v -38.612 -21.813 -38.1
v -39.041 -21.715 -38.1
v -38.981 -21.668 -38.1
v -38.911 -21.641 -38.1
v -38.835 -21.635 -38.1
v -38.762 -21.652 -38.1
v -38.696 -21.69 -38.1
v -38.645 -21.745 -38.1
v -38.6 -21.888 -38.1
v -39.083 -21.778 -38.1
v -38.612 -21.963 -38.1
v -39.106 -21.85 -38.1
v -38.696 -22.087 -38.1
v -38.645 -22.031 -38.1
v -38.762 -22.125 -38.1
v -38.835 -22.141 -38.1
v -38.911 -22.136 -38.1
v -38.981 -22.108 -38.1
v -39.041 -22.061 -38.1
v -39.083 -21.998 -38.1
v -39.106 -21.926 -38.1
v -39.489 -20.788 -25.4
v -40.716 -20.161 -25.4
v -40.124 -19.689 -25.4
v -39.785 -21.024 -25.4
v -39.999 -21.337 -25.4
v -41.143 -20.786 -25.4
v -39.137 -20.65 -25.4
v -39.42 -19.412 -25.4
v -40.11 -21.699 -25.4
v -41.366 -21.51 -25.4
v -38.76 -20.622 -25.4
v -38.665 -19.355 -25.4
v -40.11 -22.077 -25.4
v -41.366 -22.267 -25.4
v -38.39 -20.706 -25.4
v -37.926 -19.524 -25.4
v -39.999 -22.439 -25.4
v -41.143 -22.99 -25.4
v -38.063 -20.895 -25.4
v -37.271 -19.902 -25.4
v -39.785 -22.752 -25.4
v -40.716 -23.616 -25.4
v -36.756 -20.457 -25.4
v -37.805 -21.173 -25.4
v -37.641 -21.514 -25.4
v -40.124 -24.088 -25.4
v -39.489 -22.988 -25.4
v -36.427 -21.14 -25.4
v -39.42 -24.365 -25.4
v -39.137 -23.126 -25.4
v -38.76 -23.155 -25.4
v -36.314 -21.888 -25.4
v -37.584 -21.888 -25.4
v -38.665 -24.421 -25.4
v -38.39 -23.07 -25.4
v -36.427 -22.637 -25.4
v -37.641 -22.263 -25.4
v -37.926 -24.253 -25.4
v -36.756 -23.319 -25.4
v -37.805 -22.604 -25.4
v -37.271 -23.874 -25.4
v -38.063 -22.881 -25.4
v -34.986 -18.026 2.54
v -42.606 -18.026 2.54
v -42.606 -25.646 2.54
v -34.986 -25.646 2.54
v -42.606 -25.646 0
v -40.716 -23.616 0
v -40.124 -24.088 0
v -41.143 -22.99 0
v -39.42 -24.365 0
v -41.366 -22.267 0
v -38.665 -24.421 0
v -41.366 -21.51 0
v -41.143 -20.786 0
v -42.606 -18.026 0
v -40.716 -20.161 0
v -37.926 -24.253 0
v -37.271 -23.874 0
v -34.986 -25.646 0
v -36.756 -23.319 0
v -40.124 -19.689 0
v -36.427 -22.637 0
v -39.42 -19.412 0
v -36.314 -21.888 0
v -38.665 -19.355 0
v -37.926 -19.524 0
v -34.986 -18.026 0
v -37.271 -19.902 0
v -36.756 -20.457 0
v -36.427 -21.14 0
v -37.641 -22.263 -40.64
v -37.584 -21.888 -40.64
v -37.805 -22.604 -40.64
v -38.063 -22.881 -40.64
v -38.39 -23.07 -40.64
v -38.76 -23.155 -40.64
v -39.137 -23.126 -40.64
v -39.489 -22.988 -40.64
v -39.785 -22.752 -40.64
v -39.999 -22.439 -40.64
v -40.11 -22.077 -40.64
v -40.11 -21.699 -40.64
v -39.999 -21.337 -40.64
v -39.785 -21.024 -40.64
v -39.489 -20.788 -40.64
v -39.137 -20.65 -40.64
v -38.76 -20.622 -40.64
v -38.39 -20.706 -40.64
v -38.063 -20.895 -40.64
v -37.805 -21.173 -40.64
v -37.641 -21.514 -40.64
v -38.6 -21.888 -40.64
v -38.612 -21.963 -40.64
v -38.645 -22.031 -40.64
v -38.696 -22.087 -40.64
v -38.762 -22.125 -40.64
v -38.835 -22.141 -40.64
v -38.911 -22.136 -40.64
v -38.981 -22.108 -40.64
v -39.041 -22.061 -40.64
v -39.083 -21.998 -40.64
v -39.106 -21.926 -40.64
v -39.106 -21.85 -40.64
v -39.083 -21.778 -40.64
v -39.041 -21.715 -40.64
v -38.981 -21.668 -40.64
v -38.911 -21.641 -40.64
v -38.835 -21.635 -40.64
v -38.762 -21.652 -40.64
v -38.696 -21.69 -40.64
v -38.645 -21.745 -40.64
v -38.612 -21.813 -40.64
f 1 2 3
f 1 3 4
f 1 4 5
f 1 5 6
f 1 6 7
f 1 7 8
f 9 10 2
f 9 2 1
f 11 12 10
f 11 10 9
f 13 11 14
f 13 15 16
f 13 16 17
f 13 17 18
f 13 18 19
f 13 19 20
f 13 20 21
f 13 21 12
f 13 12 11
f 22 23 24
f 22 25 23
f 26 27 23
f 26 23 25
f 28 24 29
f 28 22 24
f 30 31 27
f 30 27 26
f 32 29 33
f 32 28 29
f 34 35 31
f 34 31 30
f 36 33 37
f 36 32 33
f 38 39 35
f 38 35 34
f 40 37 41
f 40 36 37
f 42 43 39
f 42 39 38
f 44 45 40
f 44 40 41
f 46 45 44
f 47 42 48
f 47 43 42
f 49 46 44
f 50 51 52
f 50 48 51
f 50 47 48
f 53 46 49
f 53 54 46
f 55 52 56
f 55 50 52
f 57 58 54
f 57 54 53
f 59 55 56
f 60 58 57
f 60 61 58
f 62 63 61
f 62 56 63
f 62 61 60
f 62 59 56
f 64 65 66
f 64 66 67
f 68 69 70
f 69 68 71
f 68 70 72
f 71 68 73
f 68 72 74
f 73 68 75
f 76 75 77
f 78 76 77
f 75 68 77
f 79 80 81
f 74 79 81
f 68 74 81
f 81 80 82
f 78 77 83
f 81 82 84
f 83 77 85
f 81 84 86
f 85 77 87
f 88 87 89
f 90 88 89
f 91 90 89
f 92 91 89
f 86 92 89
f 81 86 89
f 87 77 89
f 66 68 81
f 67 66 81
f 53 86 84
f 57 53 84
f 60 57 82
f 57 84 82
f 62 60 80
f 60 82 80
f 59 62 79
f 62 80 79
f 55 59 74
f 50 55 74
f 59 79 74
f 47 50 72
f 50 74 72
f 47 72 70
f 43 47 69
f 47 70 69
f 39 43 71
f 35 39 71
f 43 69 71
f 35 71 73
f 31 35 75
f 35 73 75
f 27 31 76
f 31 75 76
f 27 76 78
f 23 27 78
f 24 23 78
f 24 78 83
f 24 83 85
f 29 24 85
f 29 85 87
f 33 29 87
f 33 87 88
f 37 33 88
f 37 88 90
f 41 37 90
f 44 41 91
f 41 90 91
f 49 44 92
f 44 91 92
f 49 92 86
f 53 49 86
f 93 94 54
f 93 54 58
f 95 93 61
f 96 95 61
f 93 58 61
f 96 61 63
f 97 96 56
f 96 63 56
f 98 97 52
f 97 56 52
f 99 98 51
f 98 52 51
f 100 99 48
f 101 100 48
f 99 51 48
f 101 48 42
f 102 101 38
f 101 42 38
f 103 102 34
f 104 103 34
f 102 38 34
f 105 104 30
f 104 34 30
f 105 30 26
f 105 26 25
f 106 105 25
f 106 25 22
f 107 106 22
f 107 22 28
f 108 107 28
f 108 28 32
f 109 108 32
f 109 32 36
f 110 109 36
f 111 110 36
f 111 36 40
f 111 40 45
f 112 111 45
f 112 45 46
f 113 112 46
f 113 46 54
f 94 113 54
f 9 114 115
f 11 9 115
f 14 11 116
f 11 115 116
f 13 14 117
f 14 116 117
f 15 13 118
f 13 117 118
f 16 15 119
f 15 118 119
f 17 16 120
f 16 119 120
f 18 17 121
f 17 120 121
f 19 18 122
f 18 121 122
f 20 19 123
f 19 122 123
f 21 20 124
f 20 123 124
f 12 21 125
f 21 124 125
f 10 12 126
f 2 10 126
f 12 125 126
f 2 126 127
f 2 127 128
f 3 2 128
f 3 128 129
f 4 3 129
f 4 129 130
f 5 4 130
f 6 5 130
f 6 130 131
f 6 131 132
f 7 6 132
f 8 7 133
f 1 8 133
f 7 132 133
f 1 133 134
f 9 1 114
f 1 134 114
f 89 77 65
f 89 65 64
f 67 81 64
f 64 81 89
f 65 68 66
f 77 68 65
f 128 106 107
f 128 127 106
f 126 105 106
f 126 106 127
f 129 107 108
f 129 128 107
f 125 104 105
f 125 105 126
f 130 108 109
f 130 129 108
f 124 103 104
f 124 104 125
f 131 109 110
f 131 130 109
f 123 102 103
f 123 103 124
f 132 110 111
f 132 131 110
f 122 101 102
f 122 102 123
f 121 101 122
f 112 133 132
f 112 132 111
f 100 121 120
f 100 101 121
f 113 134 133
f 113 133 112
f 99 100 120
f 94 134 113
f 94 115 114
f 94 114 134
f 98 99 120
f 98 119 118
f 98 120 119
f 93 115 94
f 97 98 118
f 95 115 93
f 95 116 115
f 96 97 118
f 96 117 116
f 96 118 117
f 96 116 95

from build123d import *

# Parameters (mm, degrees)
F0_W     = 7.62
F0_H     = 7.62
F1_DEPTH = 2.54
F2_R     = 1.27
F3_DEPTH = 40.64
F4_R     = 0.254
F5_DEPTH = 2.54
F2_R_2   = 2.54
F6_DEPTH = 25.4


with BuildPart() as f1:
    # F0 (on Top) → F1 (new body)
    with BuildSketch(Plane.XY):
        with Locations((-38.795546, -21.835937)):
            Rectangle(F0_W, F0_H)
    extrude(amount=F1_DEPTH)

    # F2 (on face) → F3 (join)
    with BuildSketch(Plane(origin=(0, 0, 0), x_dir=(1, 0, 0), z_dir=(0, 0, -1))):
        with Locations((-38.854431, 21.888208)):
            Circle(F2_R)
    extrude(amount=F3_DEPTH)

    # F4 (on face) → F5 (cut)
    with BuildSketch(Plane(origin=(0, 0, -40.64), x_dir=(1, 0, 0), z_dir=(0, 0, -1))):
        with Locations((-38.854431, 21.888208)):
            Circle(F4_R)
    extrude(amount=-F5_DEPTH, mode=Mode.SUBTRACT)

    # F2 (on face) → F6 (join)
    with BuildSketch(Plane(origin=(0, 0, 0), x_dir=(1, 0, 0), z_dir=(0, 0, -1))):
        with Locations((-38.854431, 21.888208)):
            Circle(F2_R_2)
        with Locations((-38.854431, 21.888208)):
            Circle(F2_R, mode=Mode.SUBTRACT)
    extrude(amount=F6_DEPTH)


solid = f1.part
